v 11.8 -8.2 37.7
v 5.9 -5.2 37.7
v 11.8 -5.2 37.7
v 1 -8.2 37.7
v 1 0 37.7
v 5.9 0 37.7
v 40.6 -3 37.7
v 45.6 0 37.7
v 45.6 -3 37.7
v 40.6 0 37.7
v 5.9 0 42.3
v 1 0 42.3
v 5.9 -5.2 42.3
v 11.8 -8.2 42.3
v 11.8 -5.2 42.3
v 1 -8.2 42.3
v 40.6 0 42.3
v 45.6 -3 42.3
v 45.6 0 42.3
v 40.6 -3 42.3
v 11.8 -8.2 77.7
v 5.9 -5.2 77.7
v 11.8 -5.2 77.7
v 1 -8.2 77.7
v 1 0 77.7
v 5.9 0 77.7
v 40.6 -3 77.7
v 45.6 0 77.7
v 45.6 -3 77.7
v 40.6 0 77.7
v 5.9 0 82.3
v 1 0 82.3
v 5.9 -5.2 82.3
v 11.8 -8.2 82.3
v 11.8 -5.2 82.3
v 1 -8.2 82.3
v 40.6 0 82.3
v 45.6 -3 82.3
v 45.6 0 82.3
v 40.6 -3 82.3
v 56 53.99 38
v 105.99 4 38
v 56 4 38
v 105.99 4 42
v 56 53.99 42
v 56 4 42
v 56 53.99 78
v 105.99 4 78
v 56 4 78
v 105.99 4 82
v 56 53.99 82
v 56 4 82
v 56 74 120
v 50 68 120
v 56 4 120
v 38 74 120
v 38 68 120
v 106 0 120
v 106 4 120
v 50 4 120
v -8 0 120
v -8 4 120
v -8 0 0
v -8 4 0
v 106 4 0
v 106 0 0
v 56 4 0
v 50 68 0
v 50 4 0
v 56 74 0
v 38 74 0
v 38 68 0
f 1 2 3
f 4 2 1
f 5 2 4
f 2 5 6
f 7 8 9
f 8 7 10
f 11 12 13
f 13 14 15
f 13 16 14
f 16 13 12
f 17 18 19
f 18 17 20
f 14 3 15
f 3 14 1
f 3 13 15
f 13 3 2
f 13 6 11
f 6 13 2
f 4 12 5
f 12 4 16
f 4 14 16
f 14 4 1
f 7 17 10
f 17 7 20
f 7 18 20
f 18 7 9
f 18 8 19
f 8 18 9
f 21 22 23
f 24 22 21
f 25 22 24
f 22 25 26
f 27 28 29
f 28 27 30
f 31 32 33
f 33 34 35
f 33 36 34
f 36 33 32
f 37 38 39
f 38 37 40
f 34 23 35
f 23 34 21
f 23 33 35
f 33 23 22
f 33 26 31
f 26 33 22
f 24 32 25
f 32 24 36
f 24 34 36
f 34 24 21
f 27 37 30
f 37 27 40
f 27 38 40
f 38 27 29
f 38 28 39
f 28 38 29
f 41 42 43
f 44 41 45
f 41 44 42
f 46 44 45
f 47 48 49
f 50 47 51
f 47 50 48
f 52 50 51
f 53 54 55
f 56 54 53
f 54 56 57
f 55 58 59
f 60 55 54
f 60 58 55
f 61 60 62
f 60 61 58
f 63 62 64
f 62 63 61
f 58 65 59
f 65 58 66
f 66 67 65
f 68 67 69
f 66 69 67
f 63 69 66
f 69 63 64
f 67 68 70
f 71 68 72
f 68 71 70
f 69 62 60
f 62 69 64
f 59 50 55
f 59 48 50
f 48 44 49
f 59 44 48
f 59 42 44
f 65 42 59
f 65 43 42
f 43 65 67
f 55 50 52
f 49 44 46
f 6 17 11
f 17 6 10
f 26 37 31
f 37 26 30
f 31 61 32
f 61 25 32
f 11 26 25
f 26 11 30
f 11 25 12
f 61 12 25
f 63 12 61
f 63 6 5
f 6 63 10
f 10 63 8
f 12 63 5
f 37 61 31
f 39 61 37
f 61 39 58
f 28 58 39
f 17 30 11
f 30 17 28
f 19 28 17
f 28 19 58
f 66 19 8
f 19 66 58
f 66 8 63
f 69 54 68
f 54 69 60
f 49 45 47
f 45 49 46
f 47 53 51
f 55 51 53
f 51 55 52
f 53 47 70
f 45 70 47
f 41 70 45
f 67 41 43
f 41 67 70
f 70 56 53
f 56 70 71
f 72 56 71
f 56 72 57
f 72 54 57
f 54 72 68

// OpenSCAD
// file: skadis-lib.scad
// Shared pieces for the SKÅDIS accessories. Not printed on its own.
//
// Frame for an accessory: the board's FRONT face is the plane y = 0 (the board fills
// y -5..0), x runs across the board, z up, and z = 0 is the centre of the slot the upper
// hanger uses. Every accessory is built in this frame and saved with as_print(), which lays
// it on its side (x becomes the print's z), so the hangers print with their layers running
// along the lip and nothing needs support.
//
// The hanger is IKEA's own way of holding on, proven on skadis-hook.scad: a 4.6 mm wide tab
// goes through a slot and a lip behind the board drops 5.9 mm below the slot; a short peg
// sits in the slot 40 mm below so the piece cannot tip, swing or lift by accident. Lift it
// 6 mm to take it off. Two hangers 40 mm apart (two slots of one row) carry anything heavy.
//
// Profile (u out from the front face, v up from the upper slot's centre), dropped position:
//   tab  u -5.2..0,    v -5.9..-1    rests on the slot's rounded bottom (-5.98 for a 4.6 tab)
//   lip  u -8.2..-5.2, v -11.8..-1   5.8 mm of board behind it
//   peg  u -3..0,      v -45.6..-40.6
// Raised 5.9 for fitting, the tab and lip (10.8 tall) pass the slot, whose straight height
// for a 4.6 mm part is 11.96; the peg stays inside the lower slot (usable -45.98..-34.02).

hanger_w = 4.6;
hanger_drop = 5.9;
hanger_bottom = -45.6;        // the lowest point of a hanger (the peg's bottom)
key_len = 13; key_neck = 5; key_tip = 11; key_depth = 3.5;
key_poly = [[-key_len / 2, -key_tip / 2], [-key_len / 2, key_tip / 2], [0, key_neck / 2], [key_len / 2, key_tip / 2], [key_len / 2, -key_tip / 2], [0, -key_neck / 2]];

module hanger2d() {
    translate([-5.2, -5.9]) square([5.2 + 0.01, 4.9]);
    translate([-8.2, -11.8]) square([3, 10.8]);
    translate([-3, -45.6]) square([3 + 0.01, 5]);
}
// extrude a 2D (u, v) profile along x, from x0 to x0 + w
module along_x(x0, w) multmatrix([[0, 0, 1, x0], [1, 0, 0, 0], [0, 1, 0, 0], [0, 0, 0, 1]]) linear_extrude(w) children();
module hanger(x) along_x(x - hanger_w / 2, hanger_w) hanger2d();
module hangers(xs) for (x = xs) hanger(x);
// a slab from the front face: u 0..t, v v0..v1, x x0..x1 (the spine that sits on the board)
module spine(x0, x1, v0, v1, t = 4) translate([x0, 0, v0]) cube([x1 - x0, t, v1 - v0]);
// lay the finished accessory on its side for printing: x up, lying on its x = 0 face
module as_print() rotate([0, -90, 0]) children();
// rounded 2D rectangle, for arms and lips
module rr(w, h, r) offset(r = r, $fn = 24) offset(delta = -r) square([w, h]);
// main file
// Shelf for the SKÅDIS board: 120 wide x 70 deep with a 12 mm front lip, two hangers and two
// gussets under it, on the shared hanger (skadis-lib.scad). Holds a couple of kilos.
// Print on the side, as saved, PETG, 4 walls, 25 % infill, no supports: every wall is
// upright in the print, which is why it has gussets rather than end walls. x2
//   openscad -o skadis-shelf-120-x2.stl skadis-shelf.scad

include <skadis-lib.scad>

W = 120; D = 70; lip = 12; t = 6; spine_t = 4; gusset = 50;
v_top = -50;                 // the shelf's top surface (just under the hanger pegs)
hx = [W / 2 - 20, W / 2 + 20];

module piece() {
    hangers(hx);
    spine(0, W, v_top - t - gusset, 8, spine_t);
    translate([0, 0, v_top - t]) cube([W, spine_t + D, t]);                           // the plate
    translate([0, spine_t + D - t, v_top - t]) cube([W, t, t + lip]);                  // the lip
    for (x = hx) translate([x - 2, 0, 0]) rotate([90, 0, 90]) linear_extrude(4)        // gussets under the hangers
        polygon([[spine_t - 0.01, v_top - t + 0.01], [spine_t + gusset, v_top - t + 0.01], [spine_t - 0.01, v_top - t - gusset]]);
}
as_print() piece();
